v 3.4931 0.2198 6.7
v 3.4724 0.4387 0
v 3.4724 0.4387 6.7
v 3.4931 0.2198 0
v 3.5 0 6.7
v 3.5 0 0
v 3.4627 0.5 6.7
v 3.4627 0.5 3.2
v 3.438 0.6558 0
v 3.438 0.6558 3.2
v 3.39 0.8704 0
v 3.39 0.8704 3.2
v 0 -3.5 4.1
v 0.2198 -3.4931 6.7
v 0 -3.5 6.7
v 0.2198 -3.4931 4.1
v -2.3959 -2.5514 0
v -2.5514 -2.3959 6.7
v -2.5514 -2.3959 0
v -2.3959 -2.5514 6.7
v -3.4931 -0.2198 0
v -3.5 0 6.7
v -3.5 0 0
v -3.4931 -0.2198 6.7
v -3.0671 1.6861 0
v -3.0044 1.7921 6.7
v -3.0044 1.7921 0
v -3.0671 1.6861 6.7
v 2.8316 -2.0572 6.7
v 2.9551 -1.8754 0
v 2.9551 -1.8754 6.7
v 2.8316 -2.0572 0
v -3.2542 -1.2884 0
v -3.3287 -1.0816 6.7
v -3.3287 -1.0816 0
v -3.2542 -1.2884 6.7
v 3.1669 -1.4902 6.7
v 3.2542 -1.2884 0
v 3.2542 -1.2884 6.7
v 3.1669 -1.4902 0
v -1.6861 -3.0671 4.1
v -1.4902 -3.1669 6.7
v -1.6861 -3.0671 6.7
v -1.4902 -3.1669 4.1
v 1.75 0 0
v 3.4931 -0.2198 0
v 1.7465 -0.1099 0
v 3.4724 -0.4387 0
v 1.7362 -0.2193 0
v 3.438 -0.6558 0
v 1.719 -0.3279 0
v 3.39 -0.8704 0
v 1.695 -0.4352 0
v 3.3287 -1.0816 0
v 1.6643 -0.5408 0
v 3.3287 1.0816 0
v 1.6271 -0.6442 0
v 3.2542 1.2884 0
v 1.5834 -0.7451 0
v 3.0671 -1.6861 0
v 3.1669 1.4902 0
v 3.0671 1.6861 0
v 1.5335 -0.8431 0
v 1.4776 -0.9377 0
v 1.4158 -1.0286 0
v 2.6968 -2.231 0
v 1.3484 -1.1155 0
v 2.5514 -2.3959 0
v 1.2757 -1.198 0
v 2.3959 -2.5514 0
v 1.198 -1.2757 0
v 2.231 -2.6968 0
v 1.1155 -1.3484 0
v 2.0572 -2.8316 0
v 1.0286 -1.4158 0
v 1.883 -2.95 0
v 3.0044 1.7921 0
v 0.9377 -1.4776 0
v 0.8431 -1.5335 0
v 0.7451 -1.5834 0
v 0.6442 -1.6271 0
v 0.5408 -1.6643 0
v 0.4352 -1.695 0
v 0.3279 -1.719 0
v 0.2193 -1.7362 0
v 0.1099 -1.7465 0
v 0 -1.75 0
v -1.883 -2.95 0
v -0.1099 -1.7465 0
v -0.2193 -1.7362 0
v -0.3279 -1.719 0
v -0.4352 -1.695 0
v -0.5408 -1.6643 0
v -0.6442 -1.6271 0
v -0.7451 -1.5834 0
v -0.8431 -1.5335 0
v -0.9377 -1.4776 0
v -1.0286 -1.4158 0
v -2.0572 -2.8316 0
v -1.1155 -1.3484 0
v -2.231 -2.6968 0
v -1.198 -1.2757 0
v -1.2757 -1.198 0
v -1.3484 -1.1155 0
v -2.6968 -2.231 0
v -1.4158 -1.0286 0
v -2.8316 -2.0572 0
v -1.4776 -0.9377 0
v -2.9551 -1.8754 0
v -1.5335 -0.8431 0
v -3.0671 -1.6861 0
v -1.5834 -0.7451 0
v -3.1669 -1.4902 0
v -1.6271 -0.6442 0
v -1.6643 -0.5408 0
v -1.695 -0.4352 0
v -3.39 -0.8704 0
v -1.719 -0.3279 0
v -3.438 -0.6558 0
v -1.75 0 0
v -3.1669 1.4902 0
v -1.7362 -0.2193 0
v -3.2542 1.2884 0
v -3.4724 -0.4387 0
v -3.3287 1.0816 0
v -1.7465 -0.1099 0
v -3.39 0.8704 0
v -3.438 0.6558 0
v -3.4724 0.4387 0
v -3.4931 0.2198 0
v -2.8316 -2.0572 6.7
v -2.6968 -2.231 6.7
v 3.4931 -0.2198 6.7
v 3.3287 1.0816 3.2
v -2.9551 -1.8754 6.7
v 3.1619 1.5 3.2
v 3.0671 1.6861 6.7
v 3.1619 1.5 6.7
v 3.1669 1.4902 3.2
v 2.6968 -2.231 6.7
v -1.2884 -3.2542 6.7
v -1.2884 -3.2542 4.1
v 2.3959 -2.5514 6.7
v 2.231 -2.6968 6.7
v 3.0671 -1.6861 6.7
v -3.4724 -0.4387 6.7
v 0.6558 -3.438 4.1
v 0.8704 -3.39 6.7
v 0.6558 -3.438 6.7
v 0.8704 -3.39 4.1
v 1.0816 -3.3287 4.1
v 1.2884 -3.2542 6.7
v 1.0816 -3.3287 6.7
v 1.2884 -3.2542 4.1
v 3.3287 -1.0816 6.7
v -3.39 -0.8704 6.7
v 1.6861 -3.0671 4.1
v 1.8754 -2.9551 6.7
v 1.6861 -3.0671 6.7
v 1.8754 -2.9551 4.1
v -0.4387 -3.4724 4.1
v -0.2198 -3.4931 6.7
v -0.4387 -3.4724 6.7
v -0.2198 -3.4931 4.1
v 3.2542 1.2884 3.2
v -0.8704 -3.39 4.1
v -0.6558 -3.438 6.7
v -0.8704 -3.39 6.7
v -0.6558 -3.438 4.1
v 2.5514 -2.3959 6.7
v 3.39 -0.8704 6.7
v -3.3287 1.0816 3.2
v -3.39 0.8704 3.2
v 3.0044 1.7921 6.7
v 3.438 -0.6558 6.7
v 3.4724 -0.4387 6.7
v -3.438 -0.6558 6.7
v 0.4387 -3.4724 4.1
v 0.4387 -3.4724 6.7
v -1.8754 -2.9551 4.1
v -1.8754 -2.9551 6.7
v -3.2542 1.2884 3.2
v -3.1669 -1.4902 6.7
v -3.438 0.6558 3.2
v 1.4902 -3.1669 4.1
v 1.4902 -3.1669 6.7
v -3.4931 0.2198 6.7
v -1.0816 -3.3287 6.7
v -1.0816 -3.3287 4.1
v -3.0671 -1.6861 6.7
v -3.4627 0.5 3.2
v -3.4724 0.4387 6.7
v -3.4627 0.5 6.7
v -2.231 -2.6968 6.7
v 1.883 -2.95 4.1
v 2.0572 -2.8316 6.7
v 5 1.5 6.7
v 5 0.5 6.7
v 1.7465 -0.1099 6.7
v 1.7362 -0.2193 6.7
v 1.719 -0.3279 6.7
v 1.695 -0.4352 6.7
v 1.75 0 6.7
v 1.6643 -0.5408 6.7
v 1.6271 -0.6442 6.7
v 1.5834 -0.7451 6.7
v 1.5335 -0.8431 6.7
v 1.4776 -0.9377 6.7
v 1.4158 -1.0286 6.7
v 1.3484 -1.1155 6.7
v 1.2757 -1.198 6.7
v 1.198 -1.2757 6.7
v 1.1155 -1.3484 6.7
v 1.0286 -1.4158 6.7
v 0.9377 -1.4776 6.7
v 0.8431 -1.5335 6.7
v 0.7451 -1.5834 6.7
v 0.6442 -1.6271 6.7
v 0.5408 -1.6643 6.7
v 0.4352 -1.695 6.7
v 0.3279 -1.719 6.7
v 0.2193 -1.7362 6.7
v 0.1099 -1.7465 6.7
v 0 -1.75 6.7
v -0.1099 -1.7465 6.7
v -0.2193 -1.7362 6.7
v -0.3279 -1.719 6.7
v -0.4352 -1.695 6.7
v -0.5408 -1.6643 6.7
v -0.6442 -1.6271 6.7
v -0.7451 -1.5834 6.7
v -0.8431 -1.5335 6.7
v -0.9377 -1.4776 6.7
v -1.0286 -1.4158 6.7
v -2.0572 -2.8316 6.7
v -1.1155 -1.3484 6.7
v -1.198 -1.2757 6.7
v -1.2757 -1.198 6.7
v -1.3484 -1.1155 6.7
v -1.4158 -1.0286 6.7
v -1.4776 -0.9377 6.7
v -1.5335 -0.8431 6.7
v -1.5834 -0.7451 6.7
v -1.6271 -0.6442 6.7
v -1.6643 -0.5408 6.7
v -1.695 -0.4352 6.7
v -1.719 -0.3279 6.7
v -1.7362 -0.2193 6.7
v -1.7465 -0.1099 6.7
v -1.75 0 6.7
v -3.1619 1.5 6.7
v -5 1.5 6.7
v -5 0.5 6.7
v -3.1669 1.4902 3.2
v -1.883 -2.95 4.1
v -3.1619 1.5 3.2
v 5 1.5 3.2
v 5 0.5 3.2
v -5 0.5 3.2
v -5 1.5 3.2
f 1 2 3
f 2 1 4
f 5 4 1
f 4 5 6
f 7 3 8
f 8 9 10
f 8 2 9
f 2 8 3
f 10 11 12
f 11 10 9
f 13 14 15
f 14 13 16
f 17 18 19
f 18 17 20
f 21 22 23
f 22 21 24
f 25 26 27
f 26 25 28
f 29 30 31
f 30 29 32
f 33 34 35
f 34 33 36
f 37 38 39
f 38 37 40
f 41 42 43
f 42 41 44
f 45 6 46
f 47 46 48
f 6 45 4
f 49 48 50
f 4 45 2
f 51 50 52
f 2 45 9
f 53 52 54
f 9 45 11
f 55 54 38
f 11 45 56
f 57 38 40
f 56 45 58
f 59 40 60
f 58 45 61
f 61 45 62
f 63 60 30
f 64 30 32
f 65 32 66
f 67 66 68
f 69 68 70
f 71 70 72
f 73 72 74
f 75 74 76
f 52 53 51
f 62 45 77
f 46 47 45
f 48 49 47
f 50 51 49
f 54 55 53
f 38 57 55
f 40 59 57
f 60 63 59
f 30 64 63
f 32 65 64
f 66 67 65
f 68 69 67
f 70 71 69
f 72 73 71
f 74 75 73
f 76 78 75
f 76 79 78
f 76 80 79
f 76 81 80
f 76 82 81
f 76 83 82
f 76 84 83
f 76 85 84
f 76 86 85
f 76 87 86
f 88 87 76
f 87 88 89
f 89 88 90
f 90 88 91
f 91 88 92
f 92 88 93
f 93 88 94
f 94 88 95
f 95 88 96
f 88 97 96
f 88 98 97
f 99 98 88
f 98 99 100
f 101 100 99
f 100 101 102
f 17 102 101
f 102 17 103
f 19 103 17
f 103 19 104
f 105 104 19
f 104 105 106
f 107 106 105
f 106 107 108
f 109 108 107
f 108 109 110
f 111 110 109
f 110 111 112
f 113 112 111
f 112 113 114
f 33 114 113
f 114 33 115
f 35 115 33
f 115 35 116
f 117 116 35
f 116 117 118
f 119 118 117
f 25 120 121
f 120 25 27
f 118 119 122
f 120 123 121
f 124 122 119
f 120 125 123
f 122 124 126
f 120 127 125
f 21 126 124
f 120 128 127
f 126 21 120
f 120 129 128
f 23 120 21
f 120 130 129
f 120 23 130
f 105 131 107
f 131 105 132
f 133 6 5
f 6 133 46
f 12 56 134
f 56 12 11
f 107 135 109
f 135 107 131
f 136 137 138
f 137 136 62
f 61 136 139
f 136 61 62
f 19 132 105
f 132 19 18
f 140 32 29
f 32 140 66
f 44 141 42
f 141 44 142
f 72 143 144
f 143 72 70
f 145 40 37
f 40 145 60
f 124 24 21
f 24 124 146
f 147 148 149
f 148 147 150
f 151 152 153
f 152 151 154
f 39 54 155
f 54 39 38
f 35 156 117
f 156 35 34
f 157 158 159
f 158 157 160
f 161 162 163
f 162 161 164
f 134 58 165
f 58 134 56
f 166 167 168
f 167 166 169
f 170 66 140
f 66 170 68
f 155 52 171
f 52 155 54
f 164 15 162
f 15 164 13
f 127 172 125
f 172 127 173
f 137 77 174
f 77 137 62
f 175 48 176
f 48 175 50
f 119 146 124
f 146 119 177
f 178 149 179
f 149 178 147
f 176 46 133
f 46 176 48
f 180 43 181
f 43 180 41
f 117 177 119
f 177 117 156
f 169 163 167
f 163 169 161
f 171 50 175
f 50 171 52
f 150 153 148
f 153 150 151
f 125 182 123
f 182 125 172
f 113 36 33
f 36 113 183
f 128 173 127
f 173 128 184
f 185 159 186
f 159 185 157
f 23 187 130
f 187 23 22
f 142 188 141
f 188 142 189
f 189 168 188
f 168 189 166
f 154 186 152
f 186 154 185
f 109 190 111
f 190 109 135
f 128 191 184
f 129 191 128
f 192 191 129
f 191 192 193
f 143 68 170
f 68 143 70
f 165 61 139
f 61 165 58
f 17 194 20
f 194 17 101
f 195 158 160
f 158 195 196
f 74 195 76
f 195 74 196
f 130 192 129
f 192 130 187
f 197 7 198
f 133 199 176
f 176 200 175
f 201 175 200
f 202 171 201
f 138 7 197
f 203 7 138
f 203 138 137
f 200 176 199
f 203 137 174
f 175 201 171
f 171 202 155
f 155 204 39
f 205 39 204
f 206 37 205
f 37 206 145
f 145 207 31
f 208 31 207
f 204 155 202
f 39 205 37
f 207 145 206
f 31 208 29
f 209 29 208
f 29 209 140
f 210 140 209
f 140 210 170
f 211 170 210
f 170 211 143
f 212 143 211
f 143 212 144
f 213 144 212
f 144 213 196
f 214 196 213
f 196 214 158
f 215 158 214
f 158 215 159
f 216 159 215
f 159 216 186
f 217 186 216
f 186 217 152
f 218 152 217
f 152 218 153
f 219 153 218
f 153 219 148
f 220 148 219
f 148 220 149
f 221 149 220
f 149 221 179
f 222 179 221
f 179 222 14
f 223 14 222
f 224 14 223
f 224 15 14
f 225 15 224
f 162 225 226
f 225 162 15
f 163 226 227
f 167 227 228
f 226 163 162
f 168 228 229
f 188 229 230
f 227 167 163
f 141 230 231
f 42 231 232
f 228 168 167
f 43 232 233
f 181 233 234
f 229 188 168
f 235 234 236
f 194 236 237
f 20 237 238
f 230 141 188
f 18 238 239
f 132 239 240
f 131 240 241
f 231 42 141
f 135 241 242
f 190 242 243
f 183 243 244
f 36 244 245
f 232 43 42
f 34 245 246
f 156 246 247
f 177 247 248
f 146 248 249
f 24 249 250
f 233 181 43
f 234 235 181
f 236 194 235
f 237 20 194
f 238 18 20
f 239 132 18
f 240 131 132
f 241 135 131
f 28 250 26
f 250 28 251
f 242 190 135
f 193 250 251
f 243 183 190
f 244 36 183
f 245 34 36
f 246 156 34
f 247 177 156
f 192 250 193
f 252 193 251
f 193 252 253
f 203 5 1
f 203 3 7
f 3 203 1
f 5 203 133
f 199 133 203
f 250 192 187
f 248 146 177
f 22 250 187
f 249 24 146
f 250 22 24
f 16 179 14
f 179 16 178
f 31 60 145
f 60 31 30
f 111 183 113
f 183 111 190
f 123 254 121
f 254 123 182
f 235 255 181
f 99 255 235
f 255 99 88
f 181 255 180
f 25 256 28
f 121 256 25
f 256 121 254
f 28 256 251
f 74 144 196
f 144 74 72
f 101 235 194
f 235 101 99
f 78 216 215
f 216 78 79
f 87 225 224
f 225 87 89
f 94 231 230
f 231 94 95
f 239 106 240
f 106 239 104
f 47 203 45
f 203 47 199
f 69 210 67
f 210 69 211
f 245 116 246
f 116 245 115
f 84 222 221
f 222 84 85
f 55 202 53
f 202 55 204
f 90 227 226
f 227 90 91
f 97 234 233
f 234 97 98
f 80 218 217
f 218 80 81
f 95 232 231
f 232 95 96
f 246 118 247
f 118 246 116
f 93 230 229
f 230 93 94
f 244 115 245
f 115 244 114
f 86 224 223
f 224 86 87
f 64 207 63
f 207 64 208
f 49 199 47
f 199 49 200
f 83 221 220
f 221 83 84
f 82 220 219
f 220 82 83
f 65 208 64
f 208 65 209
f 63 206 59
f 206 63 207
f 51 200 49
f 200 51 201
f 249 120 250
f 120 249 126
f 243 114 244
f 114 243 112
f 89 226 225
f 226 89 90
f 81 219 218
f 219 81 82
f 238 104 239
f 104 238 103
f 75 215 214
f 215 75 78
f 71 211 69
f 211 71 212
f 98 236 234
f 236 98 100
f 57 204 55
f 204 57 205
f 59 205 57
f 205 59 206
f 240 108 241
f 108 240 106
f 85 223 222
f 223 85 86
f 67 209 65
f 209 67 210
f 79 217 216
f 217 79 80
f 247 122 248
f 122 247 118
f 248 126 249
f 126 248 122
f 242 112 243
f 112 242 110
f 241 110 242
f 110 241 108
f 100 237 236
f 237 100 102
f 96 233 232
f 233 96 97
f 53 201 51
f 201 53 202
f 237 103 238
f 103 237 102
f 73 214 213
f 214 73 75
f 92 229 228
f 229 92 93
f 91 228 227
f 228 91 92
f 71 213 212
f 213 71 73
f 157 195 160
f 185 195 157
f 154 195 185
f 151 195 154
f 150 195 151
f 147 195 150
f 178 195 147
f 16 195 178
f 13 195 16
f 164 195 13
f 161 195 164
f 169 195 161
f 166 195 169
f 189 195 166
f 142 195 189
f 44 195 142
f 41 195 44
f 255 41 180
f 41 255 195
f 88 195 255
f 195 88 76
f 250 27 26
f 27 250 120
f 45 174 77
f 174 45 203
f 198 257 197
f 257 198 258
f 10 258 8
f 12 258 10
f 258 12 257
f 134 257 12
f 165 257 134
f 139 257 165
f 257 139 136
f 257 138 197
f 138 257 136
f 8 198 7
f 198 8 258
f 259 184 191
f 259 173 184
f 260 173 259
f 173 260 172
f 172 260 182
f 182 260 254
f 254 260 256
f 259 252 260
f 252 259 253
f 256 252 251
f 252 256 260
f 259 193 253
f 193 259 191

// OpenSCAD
$fn=100;

difference() {
    cylinder(h=6.7, d1=7, d2=7, center=false);
    translate([0, 0, -0.1])
        cylinder(h=6.9, d1=3.5, d2=3.5, center=false);
    translate([-5, -1-4.8+(3.5/2), -0.1])
        cube([10, 1.1, 4.2], center=false);
    translate([-5, +5.3-3.5, -0.1])
        cube([10, 10, 10], center=false);
    hull() {
        translate([-3.5/2, 0, -0.1])
            cube([3.5, 3, 10], center=false);
        translate([-7/2, 2.5, -0.1])
            cube([7, 1, 10], center=false);
    }
}
translate([5-2, -3.5+4, 6.7-3.5])
    cube([2, 1, 3.5], center=false);
translate([-5, -3.5+4, 6.7-3.5])
    cube([2, 1, 3.5], center=false);
